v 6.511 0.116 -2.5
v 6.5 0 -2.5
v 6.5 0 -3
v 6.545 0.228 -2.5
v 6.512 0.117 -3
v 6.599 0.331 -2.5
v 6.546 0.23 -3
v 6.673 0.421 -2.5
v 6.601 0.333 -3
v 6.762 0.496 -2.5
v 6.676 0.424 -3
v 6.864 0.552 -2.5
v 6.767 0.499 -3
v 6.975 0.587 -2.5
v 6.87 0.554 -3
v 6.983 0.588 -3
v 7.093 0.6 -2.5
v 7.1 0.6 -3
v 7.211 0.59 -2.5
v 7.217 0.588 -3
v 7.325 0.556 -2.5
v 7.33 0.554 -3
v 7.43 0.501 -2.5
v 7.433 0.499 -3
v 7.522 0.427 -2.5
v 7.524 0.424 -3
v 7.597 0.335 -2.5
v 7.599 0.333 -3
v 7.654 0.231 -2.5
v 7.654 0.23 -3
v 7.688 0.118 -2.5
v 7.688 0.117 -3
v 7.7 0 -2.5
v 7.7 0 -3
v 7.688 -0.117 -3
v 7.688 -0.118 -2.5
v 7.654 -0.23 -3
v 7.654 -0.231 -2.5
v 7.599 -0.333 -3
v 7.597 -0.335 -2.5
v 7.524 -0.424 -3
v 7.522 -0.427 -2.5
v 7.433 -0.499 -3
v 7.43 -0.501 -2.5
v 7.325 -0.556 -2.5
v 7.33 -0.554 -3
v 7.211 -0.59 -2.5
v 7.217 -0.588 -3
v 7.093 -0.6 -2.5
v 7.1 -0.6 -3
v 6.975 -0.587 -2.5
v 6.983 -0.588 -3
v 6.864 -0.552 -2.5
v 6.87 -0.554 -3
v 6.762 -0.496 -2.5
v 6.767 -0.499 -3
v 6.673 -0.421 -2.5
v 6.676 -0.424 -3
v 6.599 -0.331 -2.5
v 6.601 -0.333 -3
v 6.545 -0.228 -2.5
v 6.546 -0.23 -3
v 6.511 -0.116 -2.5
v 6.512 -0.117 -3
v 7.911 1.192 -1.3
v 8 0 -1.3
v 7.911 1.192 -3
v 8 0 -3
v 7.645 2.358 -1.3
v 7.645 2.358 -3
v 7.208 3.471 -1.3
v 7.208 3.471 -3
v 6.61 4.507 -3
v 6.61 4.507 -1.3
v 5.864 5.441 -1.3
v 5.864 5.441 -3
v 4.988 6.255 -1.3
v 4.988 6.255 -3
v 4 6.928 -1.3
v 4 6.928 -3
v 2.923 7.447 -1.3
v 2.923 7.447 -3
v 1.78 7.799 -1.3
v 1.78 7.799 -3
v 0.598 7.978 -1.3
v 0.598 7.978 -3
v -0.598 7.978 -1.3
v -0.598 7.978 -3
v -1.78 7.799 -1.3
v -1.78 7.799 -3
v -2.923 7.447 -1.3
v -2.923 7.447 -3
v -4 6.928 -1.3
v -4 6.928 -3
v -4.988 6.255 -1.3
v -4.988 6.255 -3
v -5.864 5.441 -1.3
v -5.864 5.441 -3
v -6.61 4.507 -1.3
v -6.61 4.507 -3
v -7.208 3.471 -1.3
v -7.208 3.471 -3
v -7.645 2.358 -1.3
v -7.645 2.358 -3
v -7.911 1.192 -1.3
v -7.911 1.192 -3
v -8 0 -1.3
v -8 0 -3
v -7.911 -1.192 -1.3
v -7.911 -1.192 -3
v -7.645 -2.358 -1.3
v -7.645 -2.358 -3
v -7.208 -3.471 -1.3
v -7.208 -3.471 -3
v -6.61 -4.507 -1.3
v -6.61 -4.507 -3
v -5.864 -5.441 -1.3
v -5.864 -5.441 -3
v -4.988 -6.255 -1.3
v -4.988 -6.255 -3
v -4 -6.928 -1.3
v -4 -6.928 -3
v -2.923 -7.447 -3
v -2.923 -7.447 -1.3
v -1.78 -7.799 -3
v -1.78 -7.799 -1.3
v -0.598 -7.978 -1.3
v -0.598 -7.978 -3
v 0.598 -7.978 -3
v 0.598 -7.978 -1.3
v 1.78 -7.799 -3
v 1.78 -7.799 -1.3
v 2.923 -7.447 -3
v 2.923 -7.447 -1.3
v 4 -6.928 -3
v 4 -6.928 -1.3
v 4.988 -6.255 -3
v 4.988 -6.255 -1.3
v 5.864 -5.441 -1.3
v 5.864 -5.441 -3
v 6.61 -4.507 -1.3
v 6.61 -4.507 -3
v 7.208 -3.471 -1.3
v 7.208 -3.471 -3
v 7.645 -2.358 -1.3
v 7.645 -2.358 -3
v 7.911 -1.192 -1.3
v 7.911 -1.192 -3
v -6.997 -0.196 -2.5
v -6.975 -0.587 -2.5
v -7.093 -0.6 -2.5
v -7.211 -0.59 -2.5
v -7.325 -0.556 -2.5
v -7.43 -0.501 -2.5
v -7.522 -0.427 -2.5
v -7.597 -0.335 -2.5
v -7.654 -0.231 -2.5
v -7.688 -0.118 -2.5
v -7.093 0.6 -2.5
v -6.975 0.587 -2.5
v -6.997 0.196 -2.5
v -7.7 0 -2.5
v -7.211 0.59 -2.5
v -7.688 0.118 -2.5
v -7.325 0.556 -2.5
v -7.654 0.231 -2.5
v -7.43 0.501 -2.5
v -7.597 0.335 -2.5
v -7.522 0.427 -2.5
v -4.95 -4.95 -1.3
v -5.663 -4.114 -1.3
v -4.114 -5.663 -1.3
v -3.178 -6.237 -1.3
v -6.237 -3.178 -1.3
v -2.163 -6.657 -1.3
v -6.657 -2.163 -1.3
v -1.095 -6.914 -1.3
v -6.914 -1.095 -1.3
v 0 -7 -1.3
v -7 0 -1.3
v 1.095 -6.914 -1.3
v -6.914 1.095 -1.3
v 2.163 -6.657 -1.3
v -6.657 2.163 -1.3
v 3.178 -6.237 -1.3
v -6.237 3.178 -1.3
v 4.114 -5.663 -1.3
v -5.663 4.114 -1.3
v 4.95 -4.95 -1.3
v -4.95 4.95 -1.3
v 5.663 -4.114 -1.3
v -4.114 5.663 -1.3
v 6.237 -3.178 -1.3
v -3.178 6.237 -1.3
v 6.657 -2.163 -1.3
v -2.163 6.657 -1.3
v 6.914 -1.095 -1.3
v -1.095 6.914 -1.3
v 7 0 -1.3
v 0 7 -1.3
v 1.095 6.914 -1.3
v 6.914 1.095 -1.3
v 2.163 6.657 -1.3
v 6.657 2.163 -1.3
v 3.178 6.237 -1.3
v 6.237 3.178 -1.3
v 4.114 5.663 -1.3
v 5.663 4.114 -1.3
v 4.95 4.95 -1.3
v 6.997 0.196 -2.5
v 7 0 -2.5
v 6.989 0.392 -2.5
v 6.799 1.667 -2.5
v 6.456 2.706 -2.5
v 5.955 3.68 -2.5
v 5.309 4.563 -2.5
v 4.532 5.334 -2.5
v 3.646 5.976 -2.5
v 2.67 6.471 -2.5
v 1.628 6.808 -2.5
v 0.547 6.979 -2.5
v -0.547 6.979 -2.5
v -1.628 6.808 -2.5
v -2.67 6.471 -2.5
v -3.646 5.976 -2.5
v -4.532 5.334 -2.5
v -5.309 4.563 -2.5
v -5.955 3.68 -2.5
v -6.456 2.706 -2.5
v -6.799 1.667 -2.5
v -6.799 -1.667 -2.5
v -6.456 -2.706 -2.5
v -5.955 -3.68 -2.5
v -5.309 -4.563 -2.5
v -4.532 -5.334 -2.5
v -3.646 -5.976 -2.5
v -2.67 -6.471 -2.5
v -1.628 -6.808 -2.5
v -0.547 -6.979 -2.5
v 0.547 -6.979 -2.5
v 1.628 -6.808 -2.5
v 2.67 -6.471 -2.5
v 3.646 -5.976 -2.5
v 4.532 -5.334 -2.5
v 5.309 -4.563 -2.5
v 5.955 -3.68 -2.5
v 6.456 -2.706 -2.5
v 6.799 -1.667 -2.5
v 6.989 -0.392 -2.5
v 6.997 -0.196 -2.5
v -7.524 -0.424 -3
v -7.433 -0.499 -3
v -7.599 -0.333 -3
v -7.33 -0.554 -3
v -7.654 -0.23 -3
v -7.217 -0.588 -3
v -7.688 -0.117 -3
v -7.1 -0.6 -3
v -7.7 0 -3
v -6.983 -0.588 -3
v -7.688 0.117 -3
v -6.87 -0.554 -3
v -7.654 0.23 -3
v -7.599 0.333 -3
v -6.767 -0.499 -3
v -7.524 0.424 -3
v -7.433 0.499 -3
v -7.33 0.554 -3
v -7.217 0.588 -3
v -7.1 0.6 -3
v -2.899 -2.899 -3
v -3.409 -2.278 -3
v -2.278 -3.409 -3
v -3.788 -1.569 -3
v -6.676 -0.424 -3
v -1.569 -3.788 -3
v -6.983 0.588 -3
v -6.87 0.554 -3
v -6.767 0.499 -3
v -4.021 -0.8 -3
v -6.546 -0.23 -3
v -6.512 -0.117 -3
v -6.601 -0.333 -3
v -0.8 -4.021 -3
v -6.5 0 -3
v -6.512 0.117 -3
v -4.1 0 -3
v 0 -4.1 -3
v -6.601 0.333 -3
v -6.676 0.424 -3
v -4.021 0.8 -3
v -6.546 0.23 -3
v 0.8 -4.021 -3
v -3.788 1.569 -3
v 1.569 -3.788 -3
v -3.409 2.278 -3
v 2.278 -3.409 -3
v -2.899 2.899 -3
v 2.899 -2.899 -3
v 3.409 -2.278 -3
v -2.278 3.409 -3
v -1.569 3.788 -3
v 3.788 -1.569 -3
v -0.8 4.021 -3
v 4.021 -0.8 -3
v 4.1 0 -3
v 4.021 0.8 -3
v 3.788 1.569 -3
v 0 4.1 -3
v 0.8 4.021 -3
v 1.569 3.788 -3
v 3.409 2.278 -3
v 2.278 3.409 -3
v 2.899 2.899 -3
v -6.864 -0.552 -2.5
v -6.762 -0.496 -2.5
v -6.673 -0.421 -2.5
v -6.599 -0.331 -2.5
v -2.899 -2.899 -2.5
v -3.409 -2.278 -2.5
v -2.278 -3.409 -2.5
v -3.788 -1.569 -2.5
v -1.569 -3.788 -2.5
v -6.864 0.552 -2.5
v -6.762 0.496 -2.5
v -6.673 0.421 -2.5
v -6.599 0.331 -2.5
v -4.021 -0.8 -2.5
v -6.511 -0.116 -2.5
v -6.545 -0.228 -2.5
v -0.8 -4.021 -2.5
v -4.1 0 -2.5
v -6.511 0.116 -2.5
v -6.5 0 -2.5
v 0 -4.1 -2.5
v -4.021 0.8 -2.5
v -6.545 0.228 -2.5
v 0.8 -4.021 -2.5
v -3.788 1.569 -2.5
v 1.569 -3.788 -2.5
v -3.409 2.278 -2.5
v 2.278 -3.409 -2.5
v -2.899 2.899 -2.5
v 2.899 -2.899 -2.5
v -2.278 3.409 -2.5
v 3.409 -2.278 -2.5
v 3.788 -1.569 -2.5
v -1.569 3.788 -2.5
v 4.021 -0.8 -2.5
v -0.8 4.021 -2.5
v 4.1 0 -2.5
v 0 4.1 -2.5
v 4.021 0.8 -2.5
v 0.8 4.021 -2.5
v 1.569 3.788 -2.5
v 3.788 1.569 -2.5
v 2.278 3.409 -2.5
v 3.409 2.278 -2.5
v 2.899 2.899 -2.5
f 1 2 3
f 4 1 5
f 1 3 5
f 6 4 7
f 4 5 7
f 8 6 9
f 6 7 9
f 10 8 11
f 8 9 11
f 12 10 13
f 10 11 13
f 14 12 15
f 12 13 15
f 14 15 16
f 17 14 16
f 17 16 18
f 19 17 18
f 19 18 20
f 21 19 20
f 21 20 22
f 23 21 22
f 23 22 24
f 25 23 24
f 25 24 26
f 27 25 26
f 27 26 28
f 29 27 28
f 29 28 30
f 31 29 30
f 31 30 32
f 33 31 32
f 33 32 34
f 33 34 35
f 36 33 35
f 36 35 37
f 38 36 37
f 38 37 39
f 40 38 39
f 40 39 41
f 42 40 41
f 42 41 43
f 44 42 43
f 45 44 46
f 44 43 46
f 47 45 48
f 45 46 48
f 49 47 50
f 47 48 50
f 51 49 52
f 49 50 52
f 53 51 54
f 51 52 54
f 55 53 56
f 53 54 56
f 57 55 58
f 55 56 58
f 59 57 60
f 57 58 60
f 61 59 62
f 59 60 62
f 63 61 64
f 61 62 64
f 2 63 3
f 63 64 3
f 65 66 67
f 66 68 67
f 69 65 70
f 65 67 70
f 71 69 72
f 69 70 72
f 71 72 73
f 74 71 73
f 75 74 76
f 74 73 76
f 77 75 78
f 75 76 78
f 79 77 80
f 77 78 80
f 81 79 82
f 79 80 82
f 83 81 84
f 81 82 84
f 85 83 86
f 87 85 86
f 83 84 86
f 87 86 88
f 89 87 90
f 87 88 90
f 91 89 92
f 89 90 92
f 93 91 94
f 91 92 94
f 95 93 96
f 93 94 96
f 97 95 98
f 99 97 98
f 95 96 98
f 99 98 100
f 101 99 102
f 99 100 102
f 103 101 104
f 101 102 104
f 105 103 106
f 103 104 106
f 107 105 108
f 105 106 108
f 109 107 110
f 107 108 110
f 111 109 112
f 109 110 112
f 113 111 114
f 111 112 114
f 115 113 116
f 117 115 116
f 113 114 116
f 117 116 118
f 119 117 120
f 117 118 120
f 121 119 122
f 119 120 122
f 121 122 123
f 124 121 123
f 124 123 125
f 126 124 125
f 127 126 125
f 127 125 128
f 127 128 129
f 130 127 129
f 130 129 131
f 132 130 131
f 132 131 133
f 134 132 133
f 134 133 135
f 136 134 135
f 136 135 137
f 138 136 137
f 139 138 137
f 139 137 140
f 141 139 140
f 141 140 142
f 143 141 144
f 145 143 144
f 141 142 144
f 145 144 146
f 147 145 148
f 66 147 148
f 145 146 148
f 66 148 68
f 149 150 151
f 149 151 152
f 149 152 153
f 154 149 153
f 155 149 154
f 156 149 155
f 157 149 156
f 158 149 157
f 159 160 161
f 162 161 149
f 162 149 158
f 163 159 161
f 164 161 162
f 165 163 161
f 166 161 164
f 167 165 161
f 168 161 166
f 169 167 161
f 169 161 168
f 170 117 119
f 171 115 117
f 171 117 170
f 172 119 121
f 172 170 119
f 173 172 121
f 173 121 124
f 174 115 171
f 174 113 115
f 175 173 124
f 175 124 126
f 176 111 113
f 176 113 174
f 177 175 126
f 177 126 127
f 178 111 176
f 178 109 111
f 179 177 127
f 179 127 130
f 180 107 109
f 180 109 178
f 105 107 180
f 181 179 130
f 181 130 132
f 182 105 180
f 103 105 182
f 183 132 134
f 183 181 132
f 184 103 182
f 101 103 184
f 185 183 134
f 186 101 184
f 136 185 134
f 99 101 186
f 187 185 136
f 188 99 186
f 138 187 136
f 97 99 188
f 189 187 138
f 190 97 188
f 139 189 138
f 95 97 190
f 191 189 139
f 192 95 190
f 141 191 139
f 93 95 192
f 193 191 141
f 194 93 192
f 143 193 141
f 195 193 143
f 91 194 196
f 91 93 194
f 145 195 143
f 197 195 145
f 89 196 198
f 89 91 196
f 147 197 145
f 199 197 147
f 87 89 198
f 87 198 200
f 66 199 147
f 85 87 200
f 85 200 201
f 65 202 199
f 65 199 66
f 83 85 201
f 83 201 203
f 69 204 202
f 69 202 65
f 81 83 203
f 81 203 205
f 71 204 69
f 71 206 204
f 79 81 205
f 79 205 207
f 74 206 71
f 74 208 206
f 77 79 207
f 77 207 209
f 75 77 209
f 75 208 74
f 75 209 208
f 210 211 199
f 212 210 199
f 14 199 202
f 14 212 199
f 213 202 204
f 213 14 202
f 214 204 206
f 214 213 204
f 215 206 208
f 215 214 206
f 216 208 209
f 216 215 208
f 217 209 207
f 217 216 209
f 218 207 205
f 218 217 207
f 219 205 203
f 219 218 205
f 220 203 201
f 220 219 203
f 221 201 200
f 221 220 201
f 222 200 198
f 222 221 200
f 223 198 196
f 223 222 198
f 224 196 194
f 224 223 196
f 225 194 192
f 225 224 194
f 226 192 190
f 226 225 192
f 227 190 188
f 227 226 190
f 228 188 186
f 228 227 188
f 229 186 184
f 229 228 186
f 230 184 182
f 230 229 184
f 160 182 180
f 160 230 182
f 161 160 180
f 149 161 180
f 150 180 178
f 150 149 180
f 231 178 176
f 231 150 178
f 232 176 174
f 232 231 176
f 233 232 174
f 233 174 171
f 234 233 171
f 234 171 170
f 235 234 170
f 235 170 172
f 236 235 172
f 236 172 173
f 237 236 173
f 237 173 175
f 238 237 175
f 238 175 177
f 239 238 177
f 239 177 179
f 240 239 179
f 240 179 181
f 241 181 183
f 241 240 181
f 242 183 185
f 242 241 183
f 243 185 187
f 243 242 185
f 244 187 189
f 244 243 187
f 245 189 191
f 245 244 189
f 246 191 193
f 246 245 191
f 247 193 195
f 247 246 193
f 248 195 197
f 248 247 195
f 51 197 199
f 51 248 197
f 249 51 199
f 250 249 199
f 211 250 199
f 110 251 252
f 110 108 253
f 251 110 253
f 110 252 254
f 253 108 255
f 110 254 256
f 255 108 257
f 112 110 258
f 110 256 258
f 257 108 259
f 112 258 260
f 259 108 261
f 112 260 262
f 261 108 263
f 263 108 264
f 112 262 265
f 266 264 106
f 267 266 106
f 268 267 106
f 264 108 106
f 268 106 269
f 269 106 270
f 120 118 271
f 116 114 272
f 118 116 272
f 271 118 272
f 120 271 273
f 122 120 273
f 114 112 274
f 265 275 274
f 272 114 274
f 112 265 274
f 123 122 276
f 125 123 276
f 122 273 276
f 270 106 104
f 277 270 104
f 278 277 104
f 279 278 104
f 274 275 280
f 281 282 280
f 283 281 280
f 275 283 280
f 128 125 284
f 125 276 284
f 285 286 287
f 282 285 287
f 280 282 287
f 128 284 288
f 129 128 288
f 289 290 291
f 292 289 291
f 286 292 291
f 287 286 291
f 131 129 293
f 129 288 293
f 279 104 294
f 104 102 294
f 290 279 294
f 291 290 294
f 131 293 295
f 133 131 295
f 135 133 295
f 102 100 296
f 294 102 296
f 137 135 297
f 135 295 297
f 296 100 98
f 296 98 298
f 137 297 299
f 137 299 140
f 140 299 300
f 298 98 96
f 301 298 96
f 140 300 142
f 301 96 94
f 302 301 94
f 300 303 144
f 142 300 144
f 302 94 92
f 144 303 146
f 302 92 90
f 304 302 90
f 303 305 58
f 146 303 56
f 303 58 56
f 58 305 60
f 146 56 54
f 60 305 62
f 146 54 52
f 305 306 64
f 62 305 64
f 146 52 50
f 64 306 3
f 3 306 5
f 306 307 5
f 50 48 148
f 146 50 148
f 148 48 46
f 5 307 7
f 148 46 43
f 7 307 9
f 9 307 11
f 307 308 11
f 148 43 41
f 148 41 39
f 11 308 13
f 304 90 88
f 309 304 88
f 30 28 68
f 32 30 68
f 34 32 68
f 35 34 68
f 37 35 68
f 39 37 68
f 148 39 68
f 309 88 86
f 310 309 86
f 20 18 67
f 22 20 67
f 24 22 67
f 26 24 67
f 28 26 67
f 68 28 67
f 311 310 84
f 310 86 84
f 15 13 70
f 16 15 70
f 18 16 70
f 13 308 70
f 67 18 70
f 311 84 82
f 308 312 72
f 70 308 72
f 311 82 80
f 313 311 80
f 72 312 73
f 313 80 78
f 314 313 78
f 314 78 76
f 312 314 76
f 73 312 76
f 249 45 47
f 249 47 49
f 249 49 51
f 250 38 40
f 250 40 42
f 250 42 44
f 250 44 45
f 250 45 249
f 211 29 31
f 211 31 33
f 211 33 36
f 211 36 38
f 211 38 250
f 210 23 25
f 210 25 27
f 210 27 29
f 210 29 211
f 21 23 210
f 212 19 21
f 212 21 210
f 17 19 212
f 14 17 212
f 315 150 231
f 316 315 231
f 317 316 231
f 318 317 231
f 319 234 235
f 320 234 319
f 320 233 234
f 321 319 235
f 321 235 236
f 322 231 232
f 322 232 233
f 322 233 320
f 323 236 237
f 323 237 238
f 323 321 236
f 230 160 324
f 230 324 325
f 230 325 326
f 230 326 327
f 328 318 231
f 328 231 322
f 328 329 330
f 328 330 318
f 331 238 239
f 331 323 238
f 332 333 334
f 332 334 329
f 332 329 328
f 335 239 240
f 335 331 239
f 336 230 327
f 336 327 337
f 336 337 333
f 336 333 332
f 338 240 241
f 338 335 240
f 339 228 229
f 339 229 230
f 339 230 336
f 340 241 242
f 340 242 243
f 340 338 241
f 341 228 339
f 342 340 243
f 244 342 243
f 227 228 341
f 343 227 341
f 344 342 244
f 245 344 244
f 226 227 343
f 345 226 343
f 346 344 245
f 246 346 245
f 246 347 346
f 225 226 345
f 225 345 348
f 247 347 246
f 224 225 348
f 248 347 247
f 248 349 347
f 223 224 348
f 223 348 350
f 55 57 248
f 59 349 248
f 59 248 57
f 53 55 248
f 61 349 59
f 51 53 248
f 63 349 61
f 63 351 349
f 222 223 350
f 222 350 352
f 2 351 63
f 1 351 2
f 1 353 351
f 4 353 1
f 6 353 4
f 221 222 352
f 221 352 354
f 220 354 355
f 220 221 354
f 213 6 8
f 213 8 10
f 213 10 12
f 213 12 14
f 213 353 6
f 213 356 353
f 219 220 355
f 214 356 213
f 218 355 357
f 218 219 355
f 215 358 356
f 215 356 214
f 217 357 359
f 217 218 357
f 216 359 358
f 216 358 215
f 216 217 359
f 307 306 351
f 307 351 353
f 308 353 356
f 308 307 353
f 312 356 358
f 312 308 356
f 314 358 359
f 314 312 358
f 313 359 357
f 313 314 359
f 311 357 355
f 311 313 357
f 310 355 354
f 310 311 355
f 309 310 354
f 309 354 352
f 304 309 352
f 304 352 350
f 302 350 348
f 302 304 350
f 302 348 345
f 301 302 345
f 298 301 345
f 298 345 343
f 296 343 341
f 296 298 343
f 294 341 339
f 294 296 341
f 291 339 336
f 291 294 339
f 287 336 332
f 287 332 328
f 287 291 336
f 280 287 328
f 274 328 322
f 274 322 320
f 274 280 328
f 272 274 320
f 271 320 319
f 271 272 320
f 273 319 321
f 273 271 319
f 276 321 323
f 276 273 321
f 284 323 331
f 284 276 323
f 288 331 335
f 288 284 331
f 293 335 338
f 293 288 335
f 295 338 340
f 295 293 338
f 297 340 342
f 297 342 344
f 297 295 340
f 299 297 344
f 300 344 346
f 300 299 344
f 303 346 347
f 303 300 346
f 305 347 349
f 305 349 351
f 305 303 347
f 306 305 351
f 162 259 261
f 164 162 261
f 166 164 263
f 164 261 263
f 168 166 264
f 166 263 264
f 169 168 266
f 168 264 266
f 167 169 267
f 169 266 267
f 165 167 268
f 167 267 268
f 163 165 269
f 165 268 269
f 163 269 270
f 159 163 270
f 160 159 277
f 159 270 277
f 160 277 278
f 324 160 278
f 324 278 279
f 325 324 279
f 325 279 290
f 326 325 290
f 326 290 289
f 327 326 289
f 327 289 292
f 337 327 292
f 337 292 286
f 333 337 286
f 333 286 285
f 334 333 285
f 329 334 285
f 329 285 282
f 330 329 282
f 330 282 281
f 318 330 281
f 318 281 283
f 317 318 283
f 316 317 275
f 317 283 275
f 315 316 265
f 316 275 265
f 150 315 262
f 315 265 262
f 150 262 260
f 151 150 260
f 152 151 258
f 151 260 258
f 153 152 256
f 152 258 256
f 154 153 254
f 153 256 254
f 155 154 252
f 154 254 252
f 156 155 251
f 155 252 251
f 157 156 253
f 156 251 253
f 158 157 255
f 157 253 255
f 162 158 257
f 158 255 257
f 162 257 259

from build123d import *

# Parameters (mm, degrees)
OUTER_FLANGE_CONTACT_ANNULUS_ID8P2_START = -3
SKETCH1_R                                = 8
SKETCH1_R_2                              = 4.1
OUTER_FLANGE_CONTACT_ANNULUS_ID8P2_DEPTH = 0.5
M14X0P5_INTERNAL_THREAD_ENVELOPE_START   = -2.5
SKETCH2_R                                = 8
SKETCH2_R_2                              = 7
M14X0P5_INTERNAL_THREAD_ENVELOPE_DEPTH   = 1.2
SKETCH3_R                                = 0.6
TWO_PIN_WRENCH_HOLES_D1P2_DEPTH          = 0.5001


with BuildPart() as part:
    # Sketch1 → Outer_Flange_Contact_Annulus_ID8p2 (new body)
    with BuildSketch(Plane.XY.offset(OUTER_FLANGE_CONTACT_ANNULUS_ID8P2_START)):
        Circle(SKETCH1_R)
        Circle(SKETCH1_R_2, mode=Mode.SUBTRACT)
    extrude(amount=OUTER_FLANGE_CONTACT_ANNULUS_ID8P2_DEPTH)

    # Sketch2 → M14x0p5_Internal_Thread_Envelope (add)
    with BuildSketch(Plane.XY.offset(M14X0P5_INTERNAL_THREAD_ENVELOPE_START)):
        Circle(SKETCH2_R)
        Circle(SKETCH2_R_2, mode=Mode.SUBTRACT)
    extrude(amount=M14X0P5_INTERNAL_THREAD_ENVELOPE_DEPTH)

    # Sketch3 → Two_Pin_Wrench_Holes_D1p2 (cut)
    with BuildSketch(Plane(origin=(0, 0, -3), x_dir=(-1, 0, 0), z_dir=(0, 0, -1))):
        with Locations((7.1, 0)):
            Circle(SKETCH3_R)
        with Locations((-7.1, 0)):
            Circle(SKETCH3_R)
    extrude(amount=-TWO_PIN_WRENCH_HOLES_D1P2_DEPTH, mode=Mode.SUBTRACT)


solid = part.part
